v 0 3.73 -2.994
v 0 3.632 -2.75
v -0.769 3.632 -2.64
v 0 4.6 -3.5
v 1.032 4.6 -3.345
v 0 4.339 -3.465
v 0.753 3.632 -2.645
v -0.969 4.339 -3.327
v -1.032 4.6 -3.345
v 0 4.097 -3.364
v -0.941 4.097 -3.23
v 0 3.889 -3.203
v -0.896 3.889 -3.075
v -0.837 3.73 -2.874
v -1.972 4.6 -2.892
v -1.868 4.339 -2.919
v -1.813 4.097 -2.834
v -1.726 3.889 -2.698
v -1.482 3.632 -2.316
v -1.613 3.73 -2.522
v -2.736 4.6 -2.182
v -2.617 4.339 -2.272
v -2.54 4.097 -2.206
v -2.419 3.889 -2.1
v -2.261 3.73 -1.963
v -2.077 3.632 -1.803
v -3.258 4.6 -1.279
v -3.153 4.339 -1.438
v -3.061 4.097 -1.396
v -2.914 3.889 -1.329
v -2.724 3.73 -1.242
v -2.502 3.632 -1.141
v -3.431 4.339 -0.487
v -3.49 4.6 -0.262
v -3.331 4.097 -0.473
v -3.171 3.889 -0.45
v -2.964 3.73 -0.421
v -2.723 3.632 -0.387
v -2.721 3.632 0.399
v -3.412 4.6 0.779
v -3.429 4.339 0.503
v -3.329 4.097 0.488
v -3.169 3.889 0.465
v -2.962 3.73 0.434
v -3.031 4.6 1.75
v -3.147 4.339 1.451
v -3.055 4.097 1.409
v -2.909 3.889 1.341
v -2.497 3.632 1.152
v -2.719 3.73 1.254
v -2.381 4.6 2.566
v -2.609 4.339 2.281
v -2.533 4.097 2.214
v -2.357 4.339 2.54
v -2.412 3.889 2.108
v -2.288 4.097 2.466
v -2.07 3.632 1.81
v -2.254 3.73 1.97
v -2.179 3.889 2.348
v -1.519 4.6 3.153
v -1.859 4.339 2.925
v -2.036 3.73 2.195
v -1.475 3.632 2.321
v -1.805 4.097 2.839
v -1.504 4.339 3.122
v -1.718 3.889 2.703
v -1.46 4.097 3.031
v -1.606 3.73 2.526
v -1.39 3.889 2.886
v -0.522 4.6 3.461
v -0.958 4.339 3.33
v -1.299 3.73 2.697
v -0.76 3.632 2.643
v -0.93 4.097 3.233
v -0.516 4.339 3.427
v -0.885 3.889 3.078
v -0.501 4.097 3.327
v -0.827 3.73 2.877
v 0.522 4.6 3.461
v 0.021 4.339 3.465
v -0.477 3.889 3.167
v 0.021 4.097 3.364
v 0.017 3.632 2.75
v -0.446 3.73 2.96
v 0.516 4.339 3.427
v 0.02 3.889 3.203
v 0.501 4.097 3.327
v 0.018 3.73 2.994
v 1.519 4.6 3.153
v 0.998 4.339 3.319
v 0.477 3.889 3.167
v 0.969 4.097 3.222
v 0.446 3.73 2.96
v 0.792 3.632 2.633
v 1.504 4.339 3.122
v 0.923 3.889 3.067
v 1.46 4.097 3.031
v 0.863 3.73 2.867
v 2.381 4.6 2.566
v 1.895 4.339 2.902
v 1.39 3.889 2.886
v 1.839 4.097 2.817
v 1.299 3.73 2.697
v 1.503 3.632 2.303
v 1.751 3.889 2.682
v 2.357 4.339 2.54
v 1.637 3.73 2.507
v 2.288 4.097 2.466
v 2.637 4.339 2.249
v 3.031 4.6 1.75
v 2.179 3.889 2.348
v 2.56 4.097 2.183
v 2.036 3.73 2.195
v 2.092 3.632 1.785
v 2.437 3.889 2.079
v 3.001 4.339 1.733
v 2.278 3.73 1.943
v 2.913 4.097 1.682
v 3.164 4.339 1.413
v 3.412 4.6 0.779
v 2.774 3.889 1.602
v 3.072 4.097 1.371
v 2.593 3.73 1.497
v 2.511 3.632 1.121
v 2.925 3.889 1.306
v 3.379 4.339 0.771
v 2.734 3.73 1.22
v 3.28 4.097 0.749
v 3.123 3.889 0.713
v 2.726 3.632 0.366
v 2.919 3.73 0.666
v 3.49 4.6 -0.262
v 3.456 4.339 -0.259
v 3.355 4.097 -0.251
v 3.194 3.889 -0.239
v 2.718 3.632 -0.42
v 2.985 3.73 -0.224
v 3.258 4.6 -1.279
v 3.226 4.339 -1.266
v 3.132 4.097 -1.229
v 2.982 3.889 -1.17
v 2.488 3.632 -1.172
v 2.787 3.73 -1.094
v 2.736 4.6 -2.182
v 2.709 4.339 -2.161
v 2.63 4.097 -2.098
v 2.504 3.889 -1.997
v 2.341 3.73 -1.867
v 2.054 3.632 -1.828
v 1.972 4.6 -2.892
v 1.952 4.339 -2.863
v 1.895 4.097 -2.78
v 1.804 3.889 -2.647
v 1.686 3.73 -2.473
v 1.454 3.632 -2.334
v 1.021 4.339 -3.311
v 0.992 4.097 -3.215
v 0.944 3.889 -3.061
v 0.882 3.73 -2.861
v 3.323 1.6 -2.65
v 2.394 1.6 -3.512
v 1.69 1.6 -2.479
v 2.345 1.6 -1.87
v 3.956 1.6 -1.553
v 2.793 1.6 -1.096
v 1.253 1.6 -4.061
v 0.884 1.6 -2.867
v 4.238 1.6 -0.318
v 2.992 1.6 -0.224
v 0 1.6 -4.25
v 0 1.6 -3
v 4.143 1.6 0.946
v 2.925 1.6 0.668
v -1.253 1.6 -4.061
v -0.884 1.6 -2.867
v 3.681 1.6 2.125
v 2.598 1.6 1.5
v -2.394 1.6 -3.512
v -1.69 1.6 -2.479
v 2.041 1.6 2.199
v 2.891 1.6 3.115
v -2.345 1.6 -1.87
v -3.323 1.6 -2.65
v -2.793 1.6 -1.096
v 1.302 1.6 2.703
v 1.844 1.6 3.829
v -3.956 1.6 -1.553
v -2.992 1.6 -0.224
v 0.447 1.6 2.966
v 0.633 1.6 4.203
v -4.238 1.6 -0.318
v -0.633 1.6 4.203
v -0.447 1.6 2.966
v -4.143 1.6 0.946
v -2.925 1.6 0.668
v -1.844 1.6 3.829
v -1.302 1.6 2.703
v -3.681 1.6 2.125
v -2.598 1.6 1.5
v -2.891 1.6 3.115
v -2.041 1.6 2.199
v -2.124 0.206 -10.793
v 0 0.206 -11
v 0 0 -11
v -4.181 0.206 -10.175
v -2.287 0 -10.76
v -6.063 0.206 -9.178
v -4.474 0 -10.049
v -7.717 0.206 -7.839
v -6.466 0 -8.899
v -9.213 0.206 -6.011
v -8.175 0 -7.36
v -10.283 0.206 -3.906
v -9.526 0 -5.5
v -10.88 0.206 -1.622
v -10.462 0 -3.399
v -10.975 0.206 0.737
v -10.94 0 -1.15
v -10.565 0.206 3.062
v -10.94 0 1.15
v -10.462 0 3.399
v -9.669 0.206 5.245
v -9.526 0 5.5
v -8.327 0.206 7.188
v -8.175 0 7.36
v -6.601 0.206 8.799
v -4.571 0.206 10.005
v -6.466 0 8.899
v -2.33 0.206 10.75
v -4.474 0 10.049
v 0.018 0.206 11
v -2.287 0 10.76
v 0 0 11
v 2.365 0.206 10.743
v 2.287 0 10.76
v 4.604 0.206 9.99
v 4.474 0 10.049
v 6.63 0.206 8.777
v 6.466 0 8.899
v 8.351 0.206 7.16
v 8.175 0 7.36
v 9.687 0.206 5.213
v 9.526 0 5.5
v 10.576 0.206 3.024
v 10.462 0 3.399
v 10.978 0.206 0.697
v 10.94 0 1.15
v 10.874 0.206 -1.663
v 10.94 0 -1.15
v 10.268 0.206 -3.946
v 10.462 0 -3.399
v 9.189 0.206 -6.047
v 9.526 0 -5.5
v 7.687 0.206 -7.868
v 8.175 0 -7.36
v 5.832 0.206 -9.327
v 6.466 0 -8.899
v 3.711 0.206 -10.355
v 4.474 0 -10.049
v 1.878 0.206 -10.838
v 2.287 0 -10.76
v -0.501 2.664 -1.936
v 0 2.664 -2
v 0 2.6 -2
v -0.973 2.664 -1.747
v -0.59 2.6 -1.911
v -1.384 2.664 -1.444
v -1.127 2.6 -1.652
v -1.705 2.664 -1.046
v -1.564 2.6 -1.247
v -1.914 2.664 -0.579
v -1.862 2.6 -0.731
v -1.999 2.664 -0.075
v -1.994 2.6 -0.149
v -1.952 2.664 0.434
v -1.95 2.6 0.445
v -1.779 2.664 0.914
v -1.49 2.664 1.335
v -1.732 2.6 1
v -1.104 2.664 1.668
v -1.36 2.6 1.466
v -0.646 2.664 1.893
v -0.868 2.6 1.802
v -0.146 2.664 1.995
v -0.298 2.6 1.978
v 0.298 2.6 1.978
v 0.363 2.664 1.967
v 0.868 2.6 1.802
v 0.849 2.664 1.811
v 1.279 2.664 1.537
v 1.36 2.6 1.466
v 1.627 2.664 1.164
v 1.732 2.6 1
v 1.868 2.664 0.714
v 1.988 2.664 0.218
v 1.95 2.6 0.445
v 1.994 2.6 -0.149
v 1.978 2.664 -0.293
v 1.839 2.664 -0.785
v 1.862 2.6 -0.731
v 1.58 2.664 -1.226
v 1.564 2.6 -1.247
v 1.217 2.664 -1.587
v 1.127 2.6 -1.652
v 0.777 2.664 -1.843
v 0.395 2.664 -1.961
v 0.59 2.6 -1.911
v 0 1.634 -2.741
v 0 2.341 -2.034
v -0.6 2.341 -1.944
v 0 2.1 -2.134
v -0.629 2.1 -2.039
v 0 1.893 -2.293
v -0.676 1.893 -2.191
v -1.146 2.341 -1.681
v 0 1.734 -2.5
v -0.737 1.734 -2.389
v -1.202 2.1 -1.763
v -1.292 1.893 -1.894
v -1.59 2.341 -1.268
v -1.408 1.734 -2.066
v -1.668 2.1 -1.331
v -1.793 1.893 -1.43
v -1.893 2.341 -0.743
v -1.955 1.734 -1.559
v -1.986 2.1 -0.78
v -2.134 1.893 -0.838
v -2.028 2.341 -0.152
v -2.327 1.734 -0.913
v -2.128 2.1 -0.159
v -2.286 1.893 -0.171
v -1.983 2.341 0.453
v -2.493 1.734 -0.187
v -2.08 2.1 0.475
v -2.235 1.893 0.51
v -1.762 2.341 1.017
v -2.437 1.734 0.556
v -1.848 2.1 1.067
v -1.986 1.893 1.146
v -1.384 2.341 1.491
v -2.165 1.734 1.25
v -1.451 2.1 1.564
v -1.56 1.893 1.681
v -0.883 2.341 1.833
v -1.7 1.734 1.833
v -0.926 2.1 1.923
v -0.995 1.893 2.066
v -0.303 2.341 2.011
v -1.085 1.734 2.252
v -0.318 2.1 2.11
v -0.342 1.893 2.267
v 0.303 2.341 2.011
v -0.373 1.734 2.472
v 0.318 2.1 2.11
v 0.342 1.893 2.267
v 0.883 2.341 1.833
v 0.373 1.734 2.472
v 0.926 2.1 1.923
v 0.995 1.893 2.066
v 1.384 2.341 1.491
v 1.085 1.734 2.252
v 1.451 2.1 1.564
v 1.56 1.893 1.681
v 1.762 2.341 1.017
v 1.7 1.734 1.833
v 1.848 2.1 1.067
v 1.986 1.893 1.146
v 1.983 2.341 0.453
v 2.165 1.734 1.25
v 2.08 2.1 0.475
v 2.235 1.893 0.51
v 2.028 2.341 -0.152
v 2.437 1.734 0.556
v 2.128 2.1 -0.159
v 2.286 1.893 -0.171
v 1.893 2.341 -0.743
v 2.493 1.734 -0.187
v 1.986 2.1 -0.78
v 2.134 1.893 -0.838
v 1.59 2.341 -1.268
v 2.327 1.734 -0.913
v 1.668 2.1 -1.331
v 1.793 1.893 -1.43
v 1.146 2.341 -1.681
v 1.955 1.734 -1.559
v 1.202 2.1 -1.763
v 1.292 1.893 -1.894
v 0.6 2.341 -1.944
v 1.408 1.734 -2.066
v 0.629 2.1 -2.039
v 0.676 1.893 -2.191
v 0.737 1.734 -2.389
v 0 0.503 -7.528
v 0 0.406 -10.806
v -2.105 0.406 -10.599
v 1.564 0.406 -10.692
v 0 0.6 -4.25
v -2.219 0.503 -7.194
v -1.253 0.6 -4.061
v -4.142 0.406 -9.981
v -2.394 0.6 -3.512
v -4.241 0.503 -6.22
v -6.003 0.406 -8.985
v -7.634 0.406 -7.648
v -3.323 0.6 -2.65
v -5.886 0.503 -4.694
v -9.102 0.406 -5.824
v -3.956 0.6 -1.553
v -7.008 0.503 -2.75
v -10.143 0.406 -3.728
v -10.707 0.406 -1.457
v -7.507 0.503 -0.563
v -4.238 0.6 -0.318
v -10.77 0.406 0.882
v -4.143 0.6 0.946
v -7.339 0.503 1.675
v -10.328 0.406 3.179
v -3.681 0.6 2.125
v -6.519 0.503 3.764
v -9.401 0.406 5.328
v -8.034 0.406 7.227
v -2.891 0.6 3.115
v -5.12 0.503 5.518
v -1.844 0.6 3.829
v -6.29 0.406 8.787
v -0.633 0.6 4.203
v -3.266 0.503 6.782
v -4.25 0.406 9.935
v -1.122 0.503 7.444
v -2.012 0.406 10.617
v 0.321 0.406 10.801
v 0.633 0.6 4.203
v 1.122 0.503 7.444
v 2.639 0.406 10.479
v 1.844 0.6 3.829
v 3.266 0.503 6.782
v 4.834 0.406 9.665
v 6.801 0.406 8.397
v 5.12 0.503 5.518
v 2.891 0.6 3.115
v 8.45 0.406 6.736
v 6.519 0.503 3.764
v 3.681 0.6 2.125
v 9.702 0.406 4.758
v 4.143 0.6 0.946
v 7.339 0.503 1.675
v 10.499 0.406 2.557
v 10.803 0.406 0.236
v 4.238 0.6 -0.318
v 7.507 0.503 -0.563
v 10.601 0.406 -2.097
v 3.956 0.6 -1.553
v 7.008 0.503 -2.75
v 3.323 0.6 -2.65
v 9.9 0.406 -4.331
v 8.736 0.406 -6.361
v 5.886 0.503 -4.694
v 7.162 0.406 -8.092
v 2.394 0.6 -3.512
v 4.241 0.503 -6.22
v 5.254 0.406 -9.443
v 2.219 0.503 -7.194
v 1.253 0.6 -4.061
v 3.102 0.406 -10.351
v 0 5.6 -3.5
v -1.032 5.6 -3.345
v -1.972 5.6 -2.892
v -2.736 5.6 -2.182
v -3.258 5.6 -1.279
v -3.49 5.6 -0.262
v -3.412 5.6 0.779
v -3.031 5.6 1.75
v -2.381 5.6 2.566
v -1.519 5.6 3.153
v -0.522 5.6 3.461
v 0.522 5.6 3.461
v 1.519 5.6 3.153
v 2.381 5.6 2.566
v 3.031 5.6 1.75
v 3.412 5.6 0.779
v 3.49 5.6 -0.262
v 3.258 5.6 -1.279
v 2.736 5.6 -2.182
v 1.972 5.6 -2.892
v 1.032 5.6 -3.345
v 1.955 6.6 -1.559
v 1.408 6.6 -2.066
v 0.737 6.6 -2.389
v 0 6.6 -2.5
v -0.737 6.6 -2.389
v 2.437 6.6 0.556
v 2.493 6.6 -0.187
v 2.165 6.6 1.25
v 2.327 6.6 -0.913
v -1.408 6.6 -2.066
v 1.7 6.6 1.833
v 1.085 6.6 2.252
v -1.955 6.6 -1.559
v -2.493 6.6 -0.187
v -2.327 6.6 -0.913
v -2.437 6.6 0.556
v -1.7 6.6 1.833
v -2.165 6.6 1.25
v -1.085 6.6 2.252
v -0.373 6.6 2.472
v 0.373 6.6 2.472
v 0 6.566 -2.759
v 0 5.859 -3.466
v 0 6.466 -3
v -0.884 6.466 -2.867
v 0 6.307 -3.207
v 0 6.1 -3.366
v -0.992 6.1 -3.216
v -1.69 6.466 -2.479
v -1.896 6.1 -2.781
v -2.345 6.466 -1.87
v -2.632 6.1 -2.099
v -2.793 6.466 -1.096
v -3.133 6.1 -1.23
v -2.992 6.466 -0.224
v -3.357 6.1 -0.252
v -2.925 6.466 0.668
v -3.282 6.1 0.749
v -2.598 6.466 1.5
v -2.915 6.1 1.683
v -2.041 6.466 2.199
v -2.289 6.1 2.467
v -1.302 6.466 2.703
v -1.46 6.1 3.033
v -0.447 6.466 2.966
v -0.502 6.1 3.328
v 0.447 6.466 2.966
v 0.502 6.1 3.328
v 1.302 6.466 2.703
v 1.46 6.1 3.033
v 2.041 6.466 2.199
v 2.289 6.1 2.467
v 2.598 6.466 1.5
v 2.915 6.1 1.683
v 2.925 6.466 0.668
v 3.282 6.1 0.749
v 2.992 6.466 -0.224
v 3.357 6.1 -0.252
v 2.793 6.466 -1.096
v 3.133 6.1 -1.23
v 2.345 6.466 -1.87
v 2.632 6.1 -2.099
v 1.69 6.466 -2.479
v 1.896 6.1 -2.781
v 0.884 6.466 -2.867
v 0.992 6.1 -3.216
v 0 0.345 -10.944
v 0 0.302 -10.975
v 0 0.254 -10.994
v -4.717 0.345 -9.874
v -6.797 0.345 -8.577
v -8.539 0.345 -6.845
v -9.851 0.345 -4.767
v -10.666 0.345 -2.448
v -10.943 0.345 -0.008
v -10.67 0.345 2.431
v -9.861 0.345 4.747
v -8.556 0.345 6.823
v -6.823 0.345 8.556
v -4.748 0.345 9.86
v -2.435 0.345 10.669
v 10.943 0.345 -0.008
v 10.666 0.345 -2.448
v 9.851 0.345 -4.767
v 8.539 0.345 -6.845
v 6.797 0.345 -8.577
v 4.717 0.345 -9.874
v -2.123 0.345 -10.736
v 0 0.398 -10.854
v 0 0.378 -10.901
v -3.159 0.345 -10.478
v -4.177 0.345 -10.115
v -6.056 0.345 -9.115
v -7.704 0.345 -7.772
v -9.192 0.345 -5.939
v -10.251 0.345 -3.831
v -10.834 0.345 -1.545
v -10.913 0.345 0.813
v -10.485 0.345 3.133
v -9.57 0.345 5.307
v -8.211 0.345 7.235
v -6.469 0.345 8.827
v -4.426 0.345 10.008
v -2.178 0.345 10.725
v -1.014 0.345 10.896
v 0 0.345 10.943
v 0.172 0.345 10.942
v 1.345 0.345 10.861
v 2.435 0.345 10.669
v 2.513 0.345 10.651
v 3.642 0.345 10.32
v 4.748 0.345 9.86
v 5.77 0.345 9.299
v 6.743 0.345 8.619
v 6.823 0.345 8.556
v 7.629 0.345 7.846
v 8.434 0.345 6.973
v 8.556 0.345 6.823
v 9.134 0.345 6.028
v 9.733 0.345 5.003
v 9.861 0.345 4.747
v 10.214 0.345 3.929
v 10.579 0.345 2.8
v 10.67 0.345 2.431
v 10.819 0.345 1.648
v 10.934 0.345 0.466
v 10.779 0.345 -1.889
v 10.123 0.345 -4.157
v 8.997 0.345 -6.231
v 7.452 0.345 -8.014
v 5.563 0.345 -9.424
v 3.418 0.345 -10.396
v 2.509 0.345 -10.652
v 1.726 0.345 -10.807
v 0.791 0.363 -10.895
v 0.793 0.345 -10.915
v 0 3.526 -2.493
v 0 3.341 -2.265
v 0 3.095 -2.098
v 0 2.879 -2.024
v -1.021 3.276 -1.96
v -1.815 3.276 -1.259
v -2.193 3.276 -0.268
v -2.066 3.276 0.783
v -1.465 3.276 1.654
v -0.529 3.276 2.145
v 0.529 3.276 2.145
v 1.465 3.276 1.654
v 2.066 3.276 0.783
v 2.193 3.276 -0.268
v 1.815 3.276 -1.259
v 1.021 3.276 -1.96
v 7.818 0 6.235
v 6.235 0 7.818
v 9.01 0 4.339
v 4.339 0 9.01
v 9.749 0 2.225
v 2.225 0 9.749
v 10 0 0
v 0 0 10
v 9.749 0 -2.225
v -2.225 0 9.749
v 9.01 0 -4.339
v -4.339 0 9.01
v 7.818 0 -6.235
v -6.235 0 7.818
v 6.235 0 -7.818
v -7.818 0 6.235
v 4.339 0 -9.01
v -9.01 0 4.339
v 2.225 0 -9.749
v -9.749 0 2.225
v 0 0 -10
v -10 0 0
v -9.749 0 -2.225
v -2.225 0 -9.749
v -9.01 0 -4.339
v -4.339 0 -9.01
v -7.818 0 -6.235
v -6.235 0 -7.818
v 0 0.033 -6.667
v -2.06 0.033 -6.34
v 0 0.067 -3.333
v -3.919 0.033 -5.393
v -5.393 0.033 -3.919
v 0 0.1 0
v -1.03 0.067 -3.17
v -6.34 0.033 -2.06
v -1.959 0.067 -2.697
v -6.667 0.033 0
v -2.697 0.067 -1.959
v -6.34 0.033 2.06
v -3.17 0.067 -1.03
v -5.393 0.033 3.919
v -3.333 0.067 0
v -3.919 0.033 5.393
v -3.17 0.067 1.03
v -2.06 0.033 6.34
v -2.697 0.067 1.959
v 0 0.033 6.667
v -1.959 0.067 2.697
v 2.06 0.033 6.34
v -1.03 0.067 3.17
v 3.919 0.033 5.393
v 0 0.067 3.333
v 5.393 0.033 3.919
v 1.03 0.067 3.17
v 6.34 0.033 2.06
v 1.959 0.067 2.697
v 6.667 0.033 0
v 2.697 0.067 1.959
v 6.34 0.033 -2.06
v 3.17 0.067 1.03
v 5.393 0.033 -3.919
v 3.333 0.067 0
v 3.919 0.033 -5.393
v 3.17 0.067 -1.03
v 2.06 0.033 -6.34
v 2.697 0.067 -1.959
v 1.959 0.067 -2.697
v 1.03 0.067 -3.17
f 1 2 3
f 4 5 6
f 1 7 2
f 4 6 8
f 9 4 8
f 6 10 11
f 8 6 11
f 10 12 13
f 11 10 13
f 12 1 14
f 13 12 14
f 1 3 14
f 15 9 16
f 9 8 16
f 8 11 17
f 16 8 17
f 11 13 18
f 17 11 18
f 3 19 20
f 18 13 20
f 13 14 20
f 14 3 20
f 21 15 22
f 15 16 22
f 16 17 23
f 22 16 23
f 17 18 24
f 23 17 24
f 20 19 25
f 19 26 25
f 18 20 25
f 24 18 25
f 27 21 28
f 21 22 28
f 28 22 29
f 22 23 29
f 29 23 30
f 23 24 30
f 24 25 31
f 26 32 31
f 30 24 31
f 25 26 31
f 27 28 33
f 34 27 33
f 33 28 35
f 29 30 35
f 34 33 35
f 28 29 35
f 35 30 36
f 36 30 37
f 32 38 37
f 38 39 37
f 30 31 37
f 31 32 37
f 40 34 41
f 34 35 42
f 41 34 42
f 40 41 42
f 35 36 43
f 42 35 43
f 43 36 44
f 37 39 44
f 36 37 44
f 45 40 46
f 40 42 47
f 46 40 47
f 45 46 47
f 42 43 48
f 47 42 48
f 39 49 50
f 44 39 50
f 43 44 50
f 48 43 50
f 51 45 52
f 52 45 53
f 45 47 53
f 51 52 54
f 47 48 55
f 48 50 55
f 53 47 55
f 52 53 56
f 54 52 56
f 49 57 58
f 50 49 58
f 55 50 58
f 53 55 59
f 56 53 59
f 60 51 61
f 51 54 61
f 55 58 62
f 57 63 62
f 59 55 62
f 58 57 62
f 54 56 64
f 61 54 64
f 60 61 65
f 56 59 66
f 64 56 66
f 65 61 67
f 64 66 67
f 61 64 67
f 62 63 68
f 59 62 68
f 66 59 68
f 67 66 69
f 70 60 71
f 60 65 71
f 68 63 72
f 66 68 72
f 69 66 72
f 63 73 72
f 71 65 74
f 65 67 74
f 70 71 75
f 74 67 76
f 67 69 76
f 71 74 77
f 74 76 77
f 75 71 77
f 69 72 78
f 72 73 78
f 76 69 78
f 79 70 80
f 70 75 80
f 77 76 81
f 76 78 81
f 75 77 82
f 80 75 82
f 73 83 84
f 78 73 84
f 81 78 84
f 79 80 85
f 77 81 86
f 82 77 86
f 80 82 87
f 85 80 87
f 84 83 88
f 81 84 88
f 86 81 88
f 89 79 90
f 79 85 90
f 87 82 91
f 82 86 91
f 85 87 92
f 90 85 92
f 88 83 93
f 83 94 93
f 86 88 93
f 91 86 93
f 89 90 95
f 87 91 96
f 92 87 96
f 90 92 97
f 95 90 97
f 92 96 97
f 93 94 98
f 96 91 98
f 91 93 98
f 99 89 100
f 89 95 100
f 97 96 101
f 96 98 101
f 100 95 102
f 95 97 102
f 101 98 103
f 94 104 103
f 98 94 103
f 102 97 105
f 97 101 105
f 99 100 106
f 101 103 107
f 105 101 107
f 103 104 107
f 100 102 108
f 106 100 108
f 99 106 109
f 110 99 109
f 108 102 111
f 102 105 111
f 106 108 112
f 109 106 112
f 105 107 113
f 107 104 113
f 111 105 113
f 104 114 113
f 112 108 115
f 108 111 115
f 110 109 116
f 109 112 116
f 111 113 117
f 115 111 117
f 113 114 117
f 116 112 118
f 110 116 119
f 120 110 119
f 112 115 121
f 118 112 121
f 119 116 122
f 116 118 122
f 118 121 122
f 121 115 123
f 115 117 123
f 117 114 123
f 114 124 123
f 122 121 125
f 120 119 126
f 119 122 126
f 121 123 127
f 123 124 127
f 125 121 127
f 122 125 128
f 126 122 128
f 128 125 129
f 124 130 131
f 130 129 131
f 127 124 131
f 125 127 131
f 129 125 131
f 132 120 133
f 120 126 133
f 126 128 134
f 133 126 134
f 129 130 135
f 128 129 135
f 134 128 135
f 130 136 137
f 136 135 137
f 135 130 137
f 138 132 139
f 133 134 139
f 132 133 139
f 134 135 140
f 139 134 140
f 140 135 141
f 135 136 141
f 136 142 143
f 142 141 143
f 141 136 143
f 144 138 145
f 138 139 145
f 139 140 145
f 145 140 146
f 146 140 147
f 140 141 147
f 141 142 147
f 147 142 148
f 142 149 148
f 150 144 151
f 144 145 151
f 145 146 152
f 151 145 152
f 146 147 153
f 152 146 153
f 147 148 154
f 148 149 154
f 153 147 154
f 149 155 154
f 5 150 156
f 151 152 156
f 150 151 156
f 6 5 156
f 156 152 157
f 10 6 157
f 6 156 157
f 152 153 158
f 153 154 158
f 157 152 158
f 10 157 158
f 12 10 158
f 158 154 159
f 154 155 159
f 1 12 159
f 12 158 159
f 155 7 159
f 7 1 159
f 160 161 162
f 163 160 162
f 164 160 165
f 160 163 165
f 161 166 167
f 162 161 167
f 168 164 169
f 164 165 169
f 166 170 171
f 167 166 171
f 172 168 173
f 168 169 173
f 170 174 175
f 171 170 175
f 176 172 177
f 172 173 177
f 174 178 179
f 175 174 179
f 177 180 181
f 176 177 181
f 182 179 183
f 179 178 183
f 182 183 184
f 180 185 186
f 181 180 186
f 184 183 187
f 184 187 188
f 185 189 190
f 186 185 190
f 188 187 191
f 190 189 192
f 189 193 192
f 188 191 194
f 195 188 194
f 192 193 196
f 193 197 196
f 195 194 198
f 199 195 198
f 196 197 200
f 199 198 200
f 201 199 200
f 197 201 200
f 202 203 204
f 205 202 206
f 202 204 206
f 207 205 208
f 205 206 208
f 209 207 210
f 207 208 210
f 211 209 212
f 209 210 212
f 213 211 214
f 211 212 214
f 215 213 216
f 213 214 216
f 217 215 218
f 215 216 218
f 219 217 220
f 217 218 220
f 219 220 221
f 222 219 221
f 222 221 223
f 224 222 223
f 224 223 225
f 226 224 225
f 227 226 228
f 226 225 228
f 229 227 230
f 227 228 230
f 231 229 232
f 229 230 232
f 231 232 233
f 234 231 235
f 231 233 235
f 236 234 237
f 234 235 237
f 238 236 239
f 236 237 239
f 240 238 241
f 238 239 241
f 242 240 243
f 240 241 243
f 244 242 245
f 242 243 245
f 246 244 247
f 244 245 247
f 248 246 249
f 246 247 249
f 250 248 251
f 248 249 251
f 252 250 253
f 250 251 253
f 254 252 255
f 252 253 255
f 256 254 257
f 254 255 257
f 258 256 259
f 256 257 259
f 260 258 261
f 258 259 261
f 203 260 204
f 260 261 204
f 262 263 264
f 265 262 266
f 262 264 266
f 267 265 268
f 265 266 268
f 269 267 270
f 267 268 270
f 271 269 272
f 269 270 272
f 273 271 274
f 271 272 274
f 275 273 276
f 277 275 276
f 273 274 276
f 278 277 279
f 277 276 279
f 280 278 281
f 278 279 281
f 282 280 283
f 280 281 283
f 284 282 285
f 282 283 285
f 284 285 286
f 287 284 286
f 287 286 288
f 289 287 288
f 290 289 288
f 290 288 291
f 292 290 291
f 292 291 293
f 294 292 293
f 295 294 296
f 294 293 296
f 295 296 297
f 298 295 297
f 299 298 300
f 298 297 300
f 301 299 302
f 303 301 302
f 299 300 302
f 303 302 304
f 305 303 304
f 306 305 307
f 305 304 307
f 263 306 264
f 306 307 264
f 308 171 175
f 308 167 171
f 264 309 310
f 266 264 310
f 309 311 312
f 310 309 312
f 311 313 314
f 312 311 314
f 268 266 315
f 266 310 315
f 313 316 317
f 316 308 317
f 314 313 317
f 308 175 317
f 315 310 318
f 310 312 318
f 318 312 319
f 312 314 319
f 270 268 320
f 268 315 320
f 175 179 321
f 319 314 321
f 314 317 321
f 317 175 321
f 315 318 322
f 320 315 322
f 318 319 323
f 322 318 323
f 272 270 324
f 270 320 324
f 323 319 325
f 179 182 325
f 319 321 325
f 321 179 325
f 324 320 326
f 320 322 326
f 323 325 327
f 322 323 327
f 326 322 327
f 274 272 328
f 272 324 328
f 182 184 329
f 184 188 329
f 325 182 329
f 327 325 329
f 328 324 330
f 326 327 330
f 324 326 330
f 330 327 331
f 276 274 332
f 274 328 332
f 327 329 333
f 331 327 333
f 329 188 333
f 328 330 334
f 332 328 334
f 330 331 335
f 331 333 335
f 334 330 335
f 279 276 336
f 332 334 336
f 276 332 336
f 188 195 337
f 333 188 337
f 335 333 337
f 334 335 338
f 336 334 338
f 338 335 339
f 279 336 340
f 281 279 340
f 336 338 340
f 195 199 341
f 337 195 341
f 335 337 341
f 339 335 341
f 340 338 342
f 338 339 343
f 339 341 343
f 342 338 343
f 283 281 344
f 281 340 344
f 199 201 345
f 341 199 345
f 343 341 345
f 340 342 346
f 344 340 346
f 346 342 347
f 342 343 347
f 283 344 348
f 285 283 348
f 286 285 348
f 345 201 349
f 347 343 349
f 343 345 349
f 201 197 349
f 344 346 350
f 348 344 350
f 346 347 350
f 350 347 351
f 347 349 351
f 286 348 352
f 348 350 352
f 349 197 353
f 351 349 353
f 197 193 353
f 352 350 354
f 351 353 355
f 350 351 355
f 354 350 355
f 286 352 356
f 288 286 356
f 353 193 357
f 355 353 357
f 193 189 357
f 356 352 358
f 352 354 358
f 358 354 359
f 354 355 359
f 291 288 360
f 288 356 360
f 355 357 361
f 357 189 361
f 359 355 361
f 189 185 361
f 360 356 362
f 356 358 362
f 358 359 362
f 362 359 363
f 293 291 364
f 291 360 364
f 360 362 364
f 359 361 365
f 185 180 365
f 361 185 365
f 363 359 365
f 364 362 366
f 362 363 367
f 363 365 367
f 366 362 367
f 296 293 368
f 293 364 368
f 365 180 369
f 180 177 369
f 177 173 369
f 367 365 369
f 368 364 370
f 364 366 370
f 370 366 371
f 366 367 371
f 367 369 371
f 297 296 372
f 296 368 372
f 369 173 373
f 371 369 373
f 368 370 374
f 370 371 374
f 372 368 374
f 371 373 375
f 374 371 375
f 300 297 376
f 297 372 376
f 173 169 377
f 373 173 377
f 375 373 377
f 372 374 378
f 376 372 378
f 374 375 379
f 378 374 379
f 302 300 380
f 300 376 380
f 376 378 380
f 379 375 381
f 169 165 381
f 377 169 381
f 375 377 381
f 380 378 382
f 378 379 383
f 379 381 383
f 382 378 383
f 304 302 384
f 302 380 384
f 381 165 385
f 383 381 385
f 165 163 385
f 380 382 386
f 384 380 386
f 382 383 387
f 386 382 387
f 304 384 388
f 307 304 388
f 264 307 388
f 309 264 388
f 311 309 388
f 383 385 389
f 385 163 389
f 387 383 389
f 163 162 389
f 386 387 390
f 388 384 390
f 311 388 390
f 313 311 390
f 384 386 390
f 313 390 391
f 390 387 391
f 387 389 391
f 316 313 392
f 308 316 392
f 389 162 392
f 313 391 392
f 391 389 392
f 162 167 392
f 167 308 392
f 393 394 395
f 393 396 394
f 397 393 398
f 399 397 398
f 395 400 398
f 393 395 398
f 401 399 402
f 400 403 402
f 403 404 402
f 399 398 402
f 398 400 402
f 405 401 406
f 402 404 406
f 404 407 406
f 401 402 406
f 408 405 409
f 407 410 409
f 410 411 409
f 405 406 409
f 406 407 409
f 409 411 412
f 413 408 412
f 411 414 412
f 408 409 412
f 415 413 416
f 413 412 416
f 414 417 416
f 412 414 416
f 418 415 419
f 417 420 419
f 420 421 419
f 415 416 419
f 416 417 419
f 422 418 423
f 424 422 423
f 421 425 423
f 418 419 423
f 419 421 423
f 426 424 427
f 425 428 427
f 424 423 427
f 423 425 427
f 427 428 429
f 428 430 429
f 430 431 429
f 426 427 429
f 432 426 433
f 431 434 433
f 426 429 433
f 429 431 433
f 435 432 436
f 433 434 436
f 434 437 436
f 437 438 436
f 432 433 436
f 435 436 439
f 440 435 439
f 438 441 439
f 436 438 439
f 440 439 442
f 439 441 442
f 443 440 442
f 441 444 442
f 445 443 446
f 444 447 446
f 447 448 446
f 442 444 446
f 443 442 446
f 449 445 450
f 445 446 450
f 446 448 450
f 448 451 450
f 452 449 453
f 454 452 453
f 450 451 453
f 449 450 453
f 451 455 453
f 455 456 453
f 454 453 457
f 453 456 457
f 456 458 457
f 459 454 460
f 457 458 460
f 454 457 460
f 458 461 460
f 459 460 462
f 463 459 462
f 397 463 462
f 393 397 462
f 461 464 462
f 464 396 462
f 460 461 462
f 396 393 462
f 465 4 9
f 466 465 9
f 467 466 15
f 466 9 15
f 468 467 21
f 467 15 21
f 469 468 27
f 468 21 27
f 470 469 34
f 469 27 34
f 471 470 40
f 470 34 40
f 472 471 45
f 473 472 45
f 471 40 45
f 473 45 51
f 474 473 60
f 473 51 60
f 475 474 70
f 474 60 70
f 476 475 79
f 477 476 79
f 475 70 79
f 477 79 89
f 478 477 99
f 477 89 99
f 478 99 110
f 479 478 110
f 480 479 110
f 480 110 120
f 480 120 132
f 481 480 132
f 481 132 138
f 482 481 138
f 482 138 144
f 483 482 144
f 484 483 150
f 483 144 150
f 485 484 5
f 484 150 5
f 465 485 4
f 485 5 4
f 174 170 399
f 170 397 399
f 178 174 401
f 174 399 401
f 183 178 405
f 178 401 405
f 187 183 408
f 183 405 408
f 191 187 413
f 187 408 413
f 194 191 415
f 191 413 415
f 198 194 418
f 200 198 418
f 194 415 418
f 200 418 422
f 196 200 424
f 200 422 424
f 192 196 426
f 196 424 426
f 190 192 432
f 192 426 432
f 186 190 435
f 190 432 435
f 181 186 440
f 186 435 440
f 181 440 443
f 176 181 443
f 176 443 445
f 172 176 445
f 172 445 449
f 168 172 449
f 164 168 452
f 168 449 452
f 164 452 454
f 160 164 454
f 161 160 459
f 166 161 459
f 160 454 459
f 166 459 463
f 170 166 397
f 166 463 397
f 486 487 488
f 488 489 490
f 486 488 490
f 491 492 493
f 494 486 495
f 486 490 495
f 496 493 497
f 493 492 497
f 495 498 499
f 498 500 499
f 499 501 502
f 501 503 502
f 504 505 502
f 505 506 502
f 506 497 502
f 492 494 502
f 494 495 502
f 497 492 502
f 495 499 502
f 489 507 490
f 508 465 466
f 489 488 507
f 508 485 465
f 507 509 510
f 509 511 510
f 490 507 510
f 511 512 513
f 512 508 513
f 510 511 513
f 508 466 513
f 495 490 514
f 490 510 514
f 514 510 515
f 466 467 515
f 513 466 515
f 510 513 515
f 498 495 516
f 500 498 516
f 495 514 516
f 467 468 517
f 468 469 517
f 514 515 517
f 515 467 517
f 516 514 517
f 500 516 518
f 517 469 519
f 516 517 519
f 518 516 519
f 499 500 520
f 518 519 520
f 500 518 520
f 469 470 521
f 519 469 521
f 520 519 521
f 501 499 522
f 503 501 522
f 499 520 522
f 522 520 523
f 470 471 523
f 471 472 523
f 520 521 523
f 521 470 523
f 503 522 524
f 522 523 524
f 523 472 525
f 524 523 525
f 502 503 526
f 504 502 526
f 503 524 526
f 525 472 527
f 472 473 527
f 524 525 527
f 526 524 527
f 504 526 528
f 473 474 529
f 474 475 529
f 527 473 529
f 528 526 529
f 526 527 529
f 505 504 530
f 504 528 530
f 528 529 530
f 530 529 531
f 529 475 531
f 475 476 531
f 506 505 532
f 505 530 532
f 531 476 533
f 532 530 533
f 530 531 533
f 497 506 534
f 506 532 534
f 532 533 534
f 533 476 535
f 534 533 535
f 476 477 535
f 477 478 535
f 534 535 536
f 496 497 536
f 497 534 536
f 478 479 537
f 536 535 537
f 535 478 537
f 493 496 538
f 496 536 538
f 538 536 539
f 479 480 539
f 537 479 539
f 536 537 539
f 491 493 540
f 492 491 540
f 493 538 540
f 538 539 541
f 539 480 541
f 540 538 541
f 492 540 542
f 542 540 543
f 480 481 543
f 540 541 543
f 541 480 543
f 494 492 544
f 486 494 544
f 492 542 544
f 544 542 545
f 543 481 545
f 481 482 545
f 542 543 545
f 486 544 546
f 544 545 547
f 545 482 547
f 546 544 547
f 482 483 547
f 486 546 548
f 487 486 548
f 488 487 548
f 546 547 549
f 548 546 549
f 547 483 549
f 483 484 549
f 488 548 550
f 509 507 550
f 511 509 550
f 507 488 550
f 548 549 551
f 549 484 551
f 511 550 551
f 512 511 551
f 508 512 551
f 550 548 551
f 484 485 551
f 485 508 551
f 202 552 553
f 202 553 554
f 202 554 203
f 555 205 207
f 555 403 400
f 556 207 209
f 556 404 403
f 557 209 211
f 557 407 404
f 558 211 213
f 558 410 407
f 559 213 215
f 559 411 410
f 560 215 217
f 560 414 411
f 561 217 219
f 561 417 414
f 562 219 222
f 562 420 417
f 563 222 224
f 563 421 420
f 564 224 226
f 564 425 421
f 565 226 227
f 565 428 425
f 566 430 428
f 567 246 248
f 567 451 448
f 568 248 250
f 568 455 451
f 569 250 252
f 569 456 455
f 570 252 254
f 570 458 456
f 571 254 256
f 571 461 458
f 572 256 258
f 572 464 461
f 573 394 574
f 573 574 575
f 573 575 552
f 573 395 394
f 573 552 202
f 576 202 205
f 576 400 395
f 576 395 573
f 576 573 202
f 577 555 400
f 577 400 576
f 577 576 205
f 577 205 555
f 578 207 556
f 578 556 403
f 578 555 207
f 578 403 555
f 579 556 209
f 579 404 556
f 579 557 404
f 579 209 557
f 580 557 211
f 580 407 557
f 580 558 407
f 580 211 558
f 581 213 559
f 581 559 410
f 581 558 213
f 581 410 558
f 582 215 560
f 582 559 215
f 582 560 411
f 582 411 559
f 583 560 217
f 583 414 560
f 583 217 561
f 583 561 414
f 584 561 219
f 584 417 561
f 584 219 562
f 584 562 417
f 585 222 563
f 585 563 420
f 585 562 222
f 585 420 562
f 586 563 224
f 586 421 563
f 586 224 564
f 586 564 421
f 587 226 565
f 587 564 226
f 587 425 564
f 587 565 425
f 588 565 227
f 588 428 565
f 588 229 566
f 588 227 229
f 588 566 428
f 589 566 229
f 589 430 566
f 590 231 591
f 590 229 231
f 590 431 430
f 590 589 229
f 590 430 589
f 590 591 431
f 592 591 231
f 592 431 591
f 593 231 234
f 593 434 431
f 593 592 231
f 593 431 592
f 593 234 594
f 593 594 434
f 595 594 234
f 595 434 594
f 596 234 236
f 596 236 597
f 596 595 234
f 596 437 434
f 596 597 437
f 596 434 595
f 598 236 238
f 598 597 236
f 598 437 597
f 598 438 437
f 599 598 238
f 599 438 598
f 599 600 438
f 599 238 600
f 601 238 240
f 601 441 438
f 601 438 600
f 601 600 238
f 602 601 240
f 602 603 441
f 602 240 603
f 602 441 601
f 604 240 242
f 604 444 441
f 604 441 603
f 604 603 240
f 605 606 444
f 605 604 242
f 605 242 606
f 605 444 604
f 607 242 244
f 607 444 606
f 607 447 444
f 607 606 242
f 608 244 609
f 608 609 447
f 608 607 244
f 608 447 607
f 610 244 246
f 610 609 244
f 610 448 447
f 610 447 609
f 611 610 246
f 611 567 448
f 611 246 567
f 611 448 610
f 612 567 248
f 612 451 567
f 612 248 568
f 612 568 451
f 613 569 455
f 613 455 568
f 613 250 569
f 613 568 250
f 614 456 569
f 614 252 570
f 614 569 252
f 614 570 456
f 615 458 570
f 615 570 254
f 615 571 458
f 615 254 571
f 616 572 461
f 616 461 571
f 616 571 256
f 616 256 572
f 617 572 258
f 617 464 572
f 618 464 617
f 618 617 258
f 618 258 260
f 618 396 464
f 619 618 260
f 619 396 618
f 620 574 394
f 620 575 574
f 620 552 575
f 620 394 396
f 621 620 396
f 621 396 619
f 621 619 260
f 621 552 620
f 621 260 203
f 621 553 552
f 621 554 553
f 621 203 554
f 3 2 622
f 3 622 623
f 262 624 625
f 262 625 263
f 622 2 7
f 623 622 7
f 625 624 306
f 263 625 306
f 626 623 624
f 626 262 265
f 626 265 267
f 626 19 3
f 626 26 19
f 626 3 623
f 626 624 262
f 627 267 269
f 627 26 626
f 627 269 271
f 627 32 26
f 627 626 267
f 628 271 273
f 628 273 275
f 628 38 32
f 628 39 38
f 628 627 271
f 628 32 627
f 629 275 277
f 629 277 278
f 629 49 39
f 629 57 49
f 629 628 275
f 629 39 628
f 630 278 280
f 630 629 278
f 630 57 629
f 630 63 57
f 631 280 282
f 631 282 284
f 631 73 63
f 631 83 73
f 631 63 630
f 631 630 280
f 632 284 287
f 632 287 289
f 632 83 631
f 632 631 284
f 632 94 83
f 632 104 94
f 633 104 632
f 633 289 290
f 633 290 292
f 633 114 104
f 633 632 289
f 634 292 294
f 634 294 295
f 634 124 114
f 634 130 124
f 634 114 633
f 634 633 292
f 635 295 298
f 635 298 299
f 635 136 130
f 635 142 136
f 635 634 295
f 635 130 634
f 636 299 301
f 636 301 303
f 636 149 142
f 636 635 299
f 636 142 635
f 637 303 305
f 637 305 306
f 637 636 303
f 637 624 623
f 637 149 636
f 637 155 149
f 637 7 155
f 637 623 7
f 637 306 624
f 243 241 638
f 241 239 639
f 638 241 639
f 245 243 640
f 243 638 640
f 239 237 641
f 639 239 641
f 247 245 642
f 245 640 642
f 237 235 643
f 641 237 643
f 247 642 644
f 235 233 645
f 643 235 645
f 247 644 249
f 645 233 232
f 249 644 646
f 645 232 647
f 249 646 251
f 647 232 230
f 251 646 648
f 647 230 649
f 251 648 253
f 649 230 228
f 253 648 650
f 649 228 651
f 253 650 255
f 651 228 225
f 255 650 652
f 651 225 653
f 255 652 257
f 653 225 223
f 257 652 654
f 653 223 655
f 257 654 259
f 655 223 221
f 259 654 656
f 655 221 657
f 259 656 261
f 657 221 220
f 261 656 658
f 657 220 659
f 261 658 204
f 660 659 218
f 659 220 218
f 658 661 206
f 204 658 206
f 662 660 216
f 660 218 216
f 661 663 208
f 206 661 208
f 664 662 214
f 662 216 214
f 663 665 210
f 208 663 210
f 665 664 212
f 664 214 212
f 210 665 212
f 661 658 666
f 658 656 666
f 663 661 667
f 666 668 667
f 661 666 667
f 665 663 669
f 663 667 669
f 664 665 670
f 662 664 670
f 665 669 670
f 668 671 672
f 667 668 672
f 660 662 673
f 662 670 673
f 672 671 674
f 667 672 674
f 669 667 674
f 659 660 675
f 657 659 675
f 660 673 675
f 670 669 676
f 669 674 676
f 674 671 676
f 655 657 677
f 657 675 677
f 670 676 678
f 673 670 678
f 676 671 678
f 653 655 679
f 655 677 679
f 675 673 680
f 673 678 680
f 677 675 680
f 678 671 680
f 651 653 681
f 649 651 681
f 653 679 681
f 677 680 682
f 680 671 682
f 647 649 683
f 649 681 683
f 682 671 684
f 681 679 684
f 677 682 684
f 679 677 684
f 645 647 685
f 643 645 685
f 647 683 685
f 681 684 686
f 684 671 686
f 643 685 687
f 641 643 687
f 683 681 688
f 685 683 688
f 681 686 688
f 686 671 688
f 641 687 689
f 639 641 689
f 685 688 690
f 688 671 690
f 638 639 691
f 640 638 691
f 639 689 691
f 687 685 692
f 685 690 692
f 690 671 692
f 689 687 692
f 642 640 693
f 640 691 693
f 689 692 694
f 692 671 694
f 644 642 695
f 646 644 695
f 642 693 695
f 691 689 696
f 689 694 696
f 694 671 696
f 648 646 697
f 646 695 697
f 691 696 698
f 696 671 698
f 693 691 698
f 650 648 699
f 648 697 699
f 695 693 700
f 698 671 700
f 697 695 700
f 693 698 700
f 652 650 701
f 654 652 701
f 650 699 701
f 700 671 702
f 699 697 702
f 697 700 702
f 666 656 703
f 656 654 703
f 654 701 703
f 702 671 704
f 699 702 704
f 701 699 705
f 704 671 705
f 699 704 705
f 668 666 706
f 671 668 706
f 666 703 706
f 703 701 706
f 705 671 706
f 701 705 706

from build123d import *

# Parameters (mm, degrees)
FILLET1_R = 1
FILLET2_R = 1
FILLET3_R = 0.2


with BuildPart() as part:
    # Sketch1 → Revolve1 (revolve)
    with BuildSketch(Plane(origin=(0, 0, 0), x_dir=(0, 0, -1), z_dir=(1, 0, 0)), mode=Mode.PRIVATE) as revolve1_sk:
        Polygon((-11, 0), (-10, 0), (0, 0.1), (0, 6.6), (-3.5, 6.6), (-3.5, 3.6), (-2, 3.6), (-2, 1.6), (-4.25, 1.6), (-4.25, 0.6), (-11, 0.4), align=None)
    revolve(revolve1_sk.sketch.rotate(Axis((0, 0, 0), (0, 1, 0)), 180), axis=Axis((0, 0, 0), (0, 1, 0)))

    # Fillet1
    fillet1_edges = [part.edges().sort_by_distance(p)[0] for p in [
        (0, 6.6, 3.5),
        (0, 3.6, 3.5),
    ]]
    fillet(fillet1_edges, radius=FILLET1_R)

    # Fillet2
    fillet2_edges = [part.edges().sort_by_distance(p)[0] for p in [
        (0, 1.6, 2),
        (0, 3.6, 2),
    ]]
    fillet(fillet2_edges, radius=FILLET2_R)

    # Fillet3
    fillet3_edges = [part.edges().sort_by_distance(p)[0] for p in [
        (0, 0.4, 11),
    ]]
    fillet(fillet3_edges, radius=FILLET3_R)


solid = part.part
